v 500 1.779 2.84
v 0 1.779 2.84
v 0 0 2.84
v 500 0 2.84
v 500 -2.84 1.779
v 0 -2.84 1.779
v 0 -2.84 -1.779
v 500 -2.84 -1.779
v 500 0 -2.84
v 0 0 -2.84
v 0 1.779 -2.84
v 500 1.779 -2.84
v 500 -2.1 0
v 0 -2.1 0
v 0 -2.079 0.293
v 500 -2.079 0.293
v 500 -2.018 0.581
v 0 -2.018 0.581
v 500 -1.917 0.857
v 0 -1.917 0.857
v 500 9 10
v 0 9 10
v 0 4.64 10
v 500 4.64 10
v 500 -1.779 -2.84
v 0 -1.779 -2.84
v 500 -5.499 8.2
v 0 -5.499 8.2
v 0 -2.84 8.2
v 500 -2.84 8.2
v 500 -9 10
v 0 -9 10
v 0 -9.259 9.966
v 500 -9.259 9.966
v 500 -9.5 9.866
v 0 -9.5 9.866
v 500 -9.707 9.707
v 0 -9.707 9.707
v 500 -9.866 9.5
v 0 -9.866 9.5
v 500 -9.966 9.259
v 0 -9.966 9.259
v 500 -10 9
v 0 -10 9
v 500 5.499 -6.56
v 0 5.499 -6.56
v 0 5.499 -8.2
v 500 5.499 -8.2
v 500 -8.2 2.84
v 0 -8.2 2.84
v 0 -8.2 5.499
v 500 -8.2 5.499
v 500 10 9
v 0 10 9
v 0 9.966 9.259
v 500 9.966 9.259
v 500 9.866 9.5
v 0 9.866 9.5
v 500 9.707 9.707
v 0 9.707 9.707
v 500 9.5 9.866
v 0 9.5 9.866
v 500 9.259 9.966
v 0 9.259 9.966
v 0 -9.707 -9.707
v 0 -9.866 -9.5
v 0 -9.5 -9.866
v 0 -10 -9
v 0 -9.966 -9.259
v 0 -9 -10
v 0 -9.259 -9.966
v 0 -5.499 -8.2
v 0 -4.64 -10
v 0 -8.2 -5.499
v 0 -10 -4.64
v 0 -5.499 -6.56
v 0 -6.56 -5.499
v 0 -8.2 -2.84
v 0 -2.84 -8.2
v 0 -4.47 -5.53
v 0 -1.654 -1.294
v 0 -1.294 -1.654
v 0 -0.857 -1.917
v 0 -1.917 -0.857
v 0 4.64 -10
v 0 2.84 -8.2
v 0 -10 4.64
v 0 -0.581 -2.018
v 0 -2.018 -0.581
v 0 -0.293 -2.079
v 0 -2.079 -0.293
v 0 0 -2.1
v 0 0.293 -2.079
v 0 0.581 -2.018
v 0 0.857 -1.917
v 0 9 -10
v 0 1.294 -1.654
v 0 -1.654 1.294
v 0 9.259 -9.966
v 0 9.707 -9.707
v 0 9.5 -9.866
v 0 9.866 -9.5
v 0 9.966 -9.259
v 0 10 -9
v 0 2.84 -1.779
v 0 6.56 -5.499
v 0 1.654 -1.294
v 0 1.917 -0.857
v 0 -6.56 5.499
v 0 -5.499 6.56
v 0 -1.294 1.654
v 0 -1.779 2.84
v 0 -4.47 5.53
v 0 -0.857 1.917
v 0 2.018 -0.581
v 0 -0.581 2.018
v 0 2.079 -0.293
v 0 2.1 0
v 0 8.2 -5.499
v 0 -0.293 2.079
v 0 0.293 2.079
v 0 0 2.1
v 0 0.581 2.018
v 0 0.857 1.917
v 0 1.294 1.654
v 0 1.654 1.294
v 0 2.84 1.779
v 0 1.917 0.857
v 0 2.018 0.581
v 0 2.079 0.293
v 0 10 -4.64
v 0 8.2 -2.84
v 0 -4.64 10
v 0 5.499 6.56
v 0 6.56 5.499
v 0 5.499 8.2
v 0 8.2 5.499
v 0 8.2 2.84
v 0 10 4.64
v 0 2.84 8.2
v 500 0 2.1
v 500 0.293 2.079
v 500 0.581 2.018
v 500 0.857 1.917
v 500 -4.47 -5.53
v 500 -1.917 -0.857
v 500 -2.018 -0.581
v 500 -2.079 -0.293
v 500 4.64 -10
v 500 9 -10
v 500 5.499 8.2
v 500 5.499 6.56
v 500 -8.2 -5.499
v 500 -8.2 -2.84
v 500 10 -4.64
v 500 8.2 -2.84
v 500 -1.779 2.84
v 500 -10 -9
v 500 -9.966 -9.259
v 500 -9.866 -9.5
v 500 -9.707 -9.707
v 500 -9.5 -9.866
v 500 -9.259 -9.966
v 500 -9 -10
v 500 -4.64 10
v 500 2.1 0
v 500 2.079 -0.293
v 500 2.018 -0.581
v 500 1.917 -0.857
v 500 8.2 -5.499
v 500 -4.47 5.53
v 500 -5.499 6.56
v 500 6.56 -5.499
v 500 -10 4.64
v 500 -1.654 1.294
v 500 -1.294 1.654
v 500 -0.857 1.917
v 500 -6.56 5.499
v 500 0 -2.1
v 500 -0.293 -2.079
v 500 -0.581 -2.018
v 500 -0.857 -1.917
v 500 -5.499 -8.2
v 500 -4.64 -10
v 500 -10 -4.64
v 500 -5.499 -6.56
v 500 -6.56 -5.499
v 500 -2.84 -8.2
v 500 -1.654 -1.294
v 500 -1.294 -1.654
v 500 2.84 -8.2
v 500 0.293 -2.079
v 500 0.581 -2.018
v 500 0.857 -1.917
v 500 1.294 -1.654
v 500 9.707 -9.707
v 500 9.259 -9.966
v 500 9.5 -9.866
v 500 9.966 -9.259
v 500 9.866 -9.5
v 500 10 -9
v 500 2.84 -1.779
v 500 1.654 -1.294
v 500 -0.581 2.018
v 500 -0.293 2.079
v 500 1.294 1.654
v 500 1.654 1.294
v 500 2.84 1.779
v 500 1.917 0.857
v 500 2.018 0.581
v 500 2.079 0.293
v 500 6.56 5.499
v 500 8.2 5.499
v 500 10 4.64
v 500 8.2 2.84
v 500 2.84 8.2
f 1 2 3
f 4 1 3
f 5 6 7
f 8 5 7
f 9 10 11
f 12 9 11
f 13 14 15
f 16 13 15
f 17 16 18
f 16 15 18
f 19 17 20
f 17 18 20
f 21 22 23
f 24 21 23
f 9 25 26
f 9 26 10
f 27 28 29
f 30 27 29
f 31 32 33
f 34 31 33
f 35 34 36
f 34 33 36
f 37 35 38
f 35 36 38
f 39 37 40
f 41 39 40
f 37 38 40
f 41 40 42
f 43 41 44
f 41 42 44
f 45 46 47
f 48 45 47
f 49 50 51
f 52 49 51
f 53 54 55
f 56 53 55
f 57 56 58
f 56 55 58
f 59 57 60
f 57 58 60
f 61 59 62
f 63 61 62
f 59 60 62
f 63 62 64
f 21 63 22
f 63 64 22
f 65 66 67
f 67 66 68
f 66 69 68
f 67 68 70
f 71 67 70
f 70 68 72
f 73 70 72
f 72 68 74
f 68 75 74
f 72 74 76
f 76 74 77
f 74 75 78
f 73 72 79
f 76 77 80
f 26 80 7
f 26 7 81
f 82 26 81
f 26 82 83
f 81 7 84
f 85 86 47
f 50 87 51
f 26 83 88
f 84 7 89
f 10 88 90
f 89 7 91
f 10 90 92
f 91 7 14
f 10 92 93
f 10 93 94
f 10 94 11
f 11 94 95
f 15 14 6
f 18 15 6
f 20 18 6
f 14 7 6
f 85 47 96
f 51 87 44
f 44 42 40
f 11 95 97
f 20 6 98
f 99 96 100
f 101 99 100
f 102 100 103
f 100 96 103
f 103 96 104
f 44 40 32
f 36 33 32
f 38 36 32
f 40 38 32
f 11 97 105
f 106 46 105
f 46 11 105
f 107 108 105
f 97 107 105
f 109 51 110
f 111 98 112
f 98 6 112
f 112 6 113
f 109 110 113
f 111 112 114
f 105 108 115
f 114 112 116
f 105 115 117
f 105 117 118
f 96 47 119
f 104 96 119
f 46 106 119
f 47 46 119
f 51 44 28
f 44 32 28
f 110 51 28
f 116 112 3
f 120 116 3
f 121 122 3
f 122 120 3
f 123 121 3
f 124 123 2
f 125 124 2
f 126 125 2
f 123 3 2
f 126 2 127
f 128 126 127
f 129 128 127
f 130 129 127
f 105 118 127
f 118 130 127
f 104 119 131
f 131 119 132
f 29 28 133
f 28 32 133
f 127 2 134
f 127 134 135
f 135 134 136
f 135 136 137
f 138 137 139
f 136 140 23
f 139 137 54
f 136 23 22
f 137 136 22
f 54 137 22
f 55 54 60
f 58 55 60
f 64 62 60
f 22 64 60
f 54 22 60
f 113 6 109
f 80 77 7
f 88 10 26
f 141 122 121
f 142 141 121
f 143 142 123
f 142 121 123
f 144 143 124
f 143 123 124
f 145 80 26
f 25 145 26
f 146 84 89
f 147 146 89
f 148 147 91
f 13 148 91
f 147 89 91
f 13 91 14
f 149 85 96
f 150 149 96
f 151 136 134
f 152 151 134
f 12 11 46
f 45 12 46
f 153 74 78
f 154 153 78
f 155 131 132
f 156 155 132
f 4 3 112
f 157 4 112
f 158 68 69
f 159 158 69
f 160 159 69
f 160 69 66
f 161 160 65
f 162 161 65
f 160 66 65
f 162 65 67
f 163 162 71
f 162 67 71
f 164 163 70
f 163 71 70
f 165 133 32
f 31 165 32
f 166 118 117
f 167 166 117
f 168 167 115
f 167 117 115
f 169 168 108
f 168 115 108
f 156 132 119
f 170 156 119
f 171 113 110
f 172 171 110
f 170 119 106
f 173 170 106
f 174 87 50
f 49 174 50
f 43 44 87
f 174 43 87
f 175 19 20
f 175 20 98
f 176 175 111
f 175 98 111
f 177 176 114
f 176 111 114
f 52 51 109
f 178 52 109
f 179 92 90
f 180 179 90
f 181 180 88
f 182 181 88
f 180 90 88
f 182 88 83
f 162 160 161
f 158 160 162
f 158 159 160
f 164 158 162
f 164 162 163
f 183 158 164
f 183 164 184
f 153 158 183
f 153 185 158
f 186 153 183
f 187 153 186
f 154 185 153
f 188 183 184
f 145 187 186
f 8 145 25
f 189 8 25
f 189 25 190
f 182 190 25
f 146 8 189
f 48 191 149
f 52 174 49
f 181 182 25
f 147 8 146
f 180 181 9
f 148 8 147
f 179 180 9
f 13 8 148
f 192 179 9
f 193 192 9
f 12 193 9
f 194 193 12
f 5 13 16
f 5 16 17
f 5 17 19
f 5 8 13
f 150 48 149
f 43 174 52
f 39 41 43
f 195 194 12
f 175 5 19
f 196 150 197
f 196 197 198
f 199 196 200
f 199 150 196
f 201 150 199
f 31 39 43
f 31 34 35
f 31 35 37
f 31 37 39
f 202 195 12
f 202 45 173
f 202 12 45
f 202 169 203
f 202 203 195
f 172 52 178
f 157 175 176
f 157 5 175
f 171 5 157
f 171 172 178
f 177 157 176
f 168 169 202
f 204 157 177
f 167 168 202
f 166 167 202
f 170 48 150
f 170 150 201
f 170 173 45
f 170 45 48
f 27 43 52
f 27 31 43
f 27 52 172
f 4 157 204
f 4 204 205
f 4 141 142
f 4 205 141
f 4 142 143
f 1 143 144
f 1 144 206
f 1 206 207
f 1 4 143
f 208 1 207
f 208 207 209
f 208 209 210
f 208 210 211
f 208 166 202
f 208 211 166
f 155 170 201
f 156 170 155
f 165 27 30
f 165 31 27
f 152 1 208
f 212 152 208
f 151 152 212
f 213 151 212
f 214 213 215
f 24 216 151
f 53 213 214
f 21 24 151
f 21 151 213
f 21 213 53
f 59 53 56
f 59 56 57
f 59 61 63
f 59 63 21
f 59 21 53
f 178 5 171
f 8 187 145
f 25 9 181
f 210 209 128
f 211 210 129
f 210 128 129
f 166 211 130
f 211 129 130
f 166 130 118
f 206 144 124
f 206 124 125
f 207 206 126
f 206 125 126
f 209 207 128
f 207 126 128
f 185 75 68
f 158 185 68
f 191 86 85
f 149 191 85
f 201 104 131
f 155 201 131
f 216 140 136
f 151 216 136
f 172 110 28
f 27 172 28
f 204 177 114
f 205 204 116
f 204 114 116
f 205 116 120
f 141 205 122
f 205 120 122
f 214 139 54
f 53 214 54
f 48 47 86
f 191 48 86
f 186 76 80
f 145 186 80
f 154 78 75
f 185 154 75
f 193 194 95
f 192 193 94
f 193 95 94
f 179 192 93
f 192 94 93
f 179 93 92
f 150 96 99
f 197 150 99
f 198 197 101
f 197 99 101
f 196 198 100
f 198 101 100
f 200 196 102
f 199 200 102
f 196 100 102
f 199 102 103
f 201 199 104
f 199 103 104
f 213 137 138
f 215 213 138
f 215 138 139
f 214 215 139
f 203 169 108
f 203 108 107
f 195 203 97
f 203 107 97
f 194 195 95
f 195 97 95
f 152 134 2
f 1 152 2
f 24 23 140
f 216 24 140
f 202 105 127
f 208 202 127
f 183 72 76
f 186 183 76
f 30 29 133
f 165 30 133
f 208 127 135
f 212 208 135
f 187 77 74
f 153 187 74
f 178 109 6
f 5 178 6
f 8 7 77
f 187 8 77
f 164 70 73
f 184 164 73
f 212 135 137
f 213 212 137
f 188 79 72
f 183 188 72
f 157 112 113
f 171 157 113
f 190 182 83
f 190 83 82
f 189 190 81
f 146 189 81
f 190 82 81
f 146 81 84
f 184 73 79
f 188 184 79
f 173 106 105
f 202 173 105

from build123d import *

# Parameters (mm, degrees)
F1_DEPTH = 500


# Not quite as in the source:
# - ends of sketch curves that miss each other by under 0.0002 mm in the source are joined


with BuildPart() as f1:
    # F0 (on Right) → F1 (new body)
    with BuildSketch(Plane.YZ):
        with BuildLine():
            Line((8.2, -10), (9, -10))
            ThreePointArc((9, -10), (9.7071067812, -9.7071067812), (10, -9))
            Line((10, -9), (10, -8.2))
            Line((10, -8.2), (8.2, -8.2))
            Line((8.2, -8.2), (8.2, -10))
        make_face()
        Polygon((5.4993398282, -8.2), (7.1393398282, -8.2), (5.4993398282, -6.56), align=None)
        Polygon((6.56, -5.4993398282), (8.2, -7.1393398282), (8.2, -5.4993398282), align=None)
        with BuildLine():
            Line((8.2, 10), (8.2, 8.2))
            Line((8.2, 8.2), (10, 8.2))
            Line((10, 8.2), (10, 9))
            ThreePointArc((10, 9), (9.7071067812, 9.7071067812), (9, 10))
            Line((9, 10), (8.2, 10))
        make_face()
        Polygon((8.2, 7.1393398282), (6.56, 5.4993398282), (8.2, 5.4993398282), align=None)
        Polygon((5.4993398282, 8.2), (5.4993398282, 6.56), (7.1393398282, 8.2), align=None)
        with BuildLine():
            Line((-9.9999004684, 8.2000055944), (-8.1999004684, 8.2000055944))
            Line((-8.1999004684, 8.2000055944), (-8.1999004684, 10.0000055944))
            Line((-8.1999004684, 10.0000055944), (-8.9999004684, 10.0000055944))
            ThreePointArc((-8.9999004684, 10.0000055944), (-9.7070072496, 9.7071123756), (-9.9999004684, 9.0000055944))
            Line((-9.9999004684, 9.0000055944), (-9.9999004684, 8.2000055944))
        make_face()
        Polygon((-7.1392402967, 8.2000055944), (-5.4992402967, 6.5600055944), (-5.4992402967, 8.2000055944), align=None)
        Polygon((-8.1999004684, 5.4993454226), (-6.5599004684, 5.4993454226), (-8.1999004684, 7.1393454226), align=None)
        with BuildLine():
            Line((-8.1999004684, -9.9999944056), (-8.1999004684, -8.1999944056))
            Line((-8.1999004684, -8.1999944056), (-9.9999004684, -8.1999944056))
            Line((-9.9999004684, -8.1999944056), (-9.9999004684, -8.9999944056))
            ThreePointArc((-9.9999004684, -8.9999944056), (-9.7070072496, -9.7071011868), (-8.9999004684, -9.9999944056))
            Line((-8.9999004684, -9.9999944056), (-8.1999004684, -9.9999944056))
        make_face()
        Polygon((-8.1999004684, -7.1393342338), (-6.5599004684, -5.4993342338), (-8.1999004684, -5.4993342338), align=None)
        Polygon((-5.4992402967, -8.1999944056), (-5.4992402967, -6.5599944056), (-7.1392402967, -8.1999944056), align=None)
        with BuildLine():
            Line((1.9173232366, -0.8566630648), (2.84, -1.7793398282))
            Line((2.84, -1.7793398282), (2.84, 0))
            Line((2.84, 0), (2.1, 0))
            ThreePointArc((2.1, 0), (2.0538231176, -0.4379618723), (1.9173232366, -0.8566630648))
        make_face()
        with BuildLine():
            Line((0, -2.84), (1.7793398282, -2.84))
            Line((1.7793398282, -2.84), (0.8566630648, -1.9173232366))
            ThreePointArc((0.8566630648, -1.9173232366), (0.4379618723, -2.0538231176), (0, -2.1))
            Line((0, -2.1), (0, -2.84))
        make_face()
        with BuildLine():
            Line((-1.7792402967, -2.8399944056), (9.95316e-05, -2.8399944056))
            Line((9.95316e-05, -2.8399944056), (0, -2.1))
            ThreePointArc((0, -2.1), (-0.4378623408, -2.0538175232), (-0.8565635332, -1.9173176422))
            Line((-0.8565635332, -1.9173176422), (-1.7792402967, -2.8399944056))
        make_face()
        Polygon((4.64, -10), (8.2, -10), (8.2, -8.2), (7.1393398282, -8.2), (5.4993398282, -8.2), (2.84, -8.2), align=None)
        Polygon((8.2, -8.2), (10, -8.2), (10, -4.64), (8.2, -2.84), (8.2, -5.4993398282), (8.2, -7.1393398282), align=None)
        with BuildLine():
            ThreePointArc((0, 2.1), (0.4379618723, 2.0538231176), (0.8566630648, 1.9173232366))
            Line((0.8566630648, 1.9173232366), (1.7793398282, 2.84))
            Line((1.7793398282, 2.84), (0, 2.84))
            Line((0, 2.84), (0, 2.1))
        make_face()
        with BuildLine():
            Line((2.1, 0), (2.84, 0))
            Line((2.84, 0), (2.84, 1.7793398282))
            Line((2.84, 1.7793398282), (1.9173232366, 0.8566630648))
            ThreePointArc((1.9173232366, 0.8566630648), (2.0538231176, 0.4379618723), (2.1, 0))
        make_face()
        with BuildLine():
            ThreePointArc((-0.8565635332, 1.917328831), (-0.4378623408, 2.053828712), (9.95316e-05, 2.1000055944))
            Line((9.95316e-05, 2.1000055944), (0, 2.84))
            Line((0, 2.84), (-1.7792402967, 2.8400055944))
            Line((-1.7792402967, 2.8400055944), (-0.8565635332, 1.917328831))
        make_face()
        Polygon((8.2, 8.2), (8.2, 7.1393398282), (8.2, 5.4993398282), (8.2, 2.84), (10, 4.64), (10, 8.2), align=None)
        Polygon((7.1393398282, 8.2), (8.2, 8.2), (8.2, 10), (4.64, 10), (2.84, 8.2), (5.4993398282, 8.2), align=None)
        with BuildLine():
            Line((-2.8399004684, 1.7793454226), (-2.8399004684, 5.5944e-06))
            Line((-2.8399004684, 5.5944e-06), (-2.0999004684, 5.5944e-06))
            ThreePointArc((-2.0999004684, 5.5944e-06), (-2.053723586, 0.4379674667), (-1.917223705, 0.8566686592))
            Line((-1.917223705, 0.8566686592), (-2.8399004684, 1.7793454226))
        make_face()
        Polygon((-8.1999004684, 10.0000055944), (-8.1999004684, 8.2000055944), (-7.1392402967, 8.2000055944), (-5.4992402967, 8.2000055944), (-2.8399004684, 8.2000055944), (-4.6399004684, 10.0000055944), align=None)
        Polygon((-8.1999004684, 5.4993454226), (-8.1999004684, 7.1393454226), (-8.1999004684, 8.2000055944), (-9.9999004684, 8.2000055944), (-9.9999004684, 4.6400055944), (-8.1999004684, 2.8400055944), align=None)
        with BuildLine():
            Line((-2.8399004684, 5.5944e-06), (-2.8399004684, -1.7793342338))
            Line((-2.8399004684, -1.7793342338), (-1.917223705, -0.8566574704))
            ThreePointArc((-1.917223705, -0.8566574704), (-2.053723586, -0.4379562779), (-2.0999004684, 5.5944e-06))
            Line((-2.0999004684, 5.5944e-06), (-2.8399004684, 5.5944e-06))
        make_face()
        Polygon((-9.9999004684, -8.1999944056), (-8.1999004684, -8.1999944056), (-8.1999004684, -7.1393342338), (-8.1999004684, -5.4993342338), (-8.1999004684, -2.8399944056), (-9.9999004684, -4.6399944056), align=None)
        Polygon((-5.4992402967, -8.1999944056), (-7.1392402967, -8.1999944056), (-8.1999004684, -8.1999944056), (-8.1999004684, -9.9999944056), (-4.6399004684, -9.9999944056), (-2.8399004684, -8.1999944056), align=None)
        with BuildLine():
            Line((-2.8399004684, -1.7793342338), (-1.7792402967, -2.8399944056))
            Line((-1.7792402967, -2.8399944056), (-0.8565635332, -1.9173176422))
            ThreePointArc((-0.8565635332, -1.9173176422), (-1.4848247089, -1.4849186461), (-1.917223705, -0.8566574704))
            Line((-1.917223705, -0.8566574704), (-2.8399004684, -1.7793342338))
        make_face()
        Polygon((-4.4695703825, -5.5303244915), (-1.7792402967, -2.8399944056), (-2.8399004684, -1.7793342338), (-5.5302305543, -4.4696643197), (-6.5599004684, -5.4993342338), (-8.1999004684, -7.1393342338), (-8.1999004684, -8.1999944056), (-7.1392402967, -8.1999944056), (-5.4992402967, -6.5599944056), align=None)
        with BuildLine():
            Line((7.1393398282, -8.2), (8.2, -8.2))
            Line((8.2, -8.2), (8.2, -7.1393398282))
            Line((8.2, -7.1393398282), (6.56, -5.4993398282))
            Line((6.56, -5.4993398282), (5.5303300859, -4.4696699141))
            Line((5.5303300859, -4.4696699141), (2.84, -1.7793398282))
            Line((2.84, -1.7793398282), (1.9173232366, -0.8566630648))
            ThreePointArc((1.9173232366, -0.8566630648), (1.4849242405, -1.4849242405), (0.8566630648, -1.9173232366))
            Line((0.8566630648, -1.9173232366), (1.7793398282, -2.84))
            Line((1.7793398282, -2.84), (4.4696699141, -5.5303300859))
            Line((4.4696699141, -5.5303300859), (5.4993398282, -6.56))
            Line((5.4993398282, -6.56), (7.1393398282, -8.2))
        make_face()
        with BuildLine():
            Line((1.9173232366, 0.8566630648), (2.84, 1.7793398282))
            Line((2.84, 1.7793398282), (5.5303300859, 4.4696699141))
            Line((5.5303300859, 4.4696699141), (6.56, 5.4993398282))
            Line((6.56, 5.4993398282), (8.2, 7.1393398282))
            Line((8.2, 7.1393398282), (8.2, 8.2))
            Line((8.2, 8.2), (7.1393398282, 8.2))
            Line((7.1393398282, 8.2), (5.4993398282, 6.56))
            Line((5.4993398282, 6.56), (4.4696699141, 5.5303300859))
            Line((4.4696699141, 5.5303300859), (1.7793398282, 2.84))
            Line((1.7793398282, 2.84), (0.8566630648, 1.9173232366))
            ThreePointArc((0.8566630648, 1.9173232366), (1.4849242405, 1.4849242405), (1.9173232366, 0.8566630648))
        make_face()
        with BuildLine():
            Line((-5.5302305543, 4.4696755085), (-2.8399004684, 1.7793454226))
            Line((-2.8399004684, 1.7793454226), (-1.917223705, 0.8566686592))
            ThreePointArc((-1.917223705, 0.8566686592), (-1.4848247089, 1.4849298349), (-0.8565635332, 1.917328831))
            Line((-0.8565635332, 1.917328831), (-1.7792402967, 2.8400055944))
            Line((-1.7792402967, 2.8400055944), (-4.4695703825, 5.5303356803))
            Line((-4.4695703825, 5.5303356803), (-5.4992402967, 6.5600055944))
            Line((-5.4992402967, 6.5600055944), (-7.1392402967, 8.2000055944))
            Line((-7.1392402967, 8.2000055944), (-8.1999004684, 8.2000055944))
            Line((-8.1999004684, 8.2000055944), (-8.1999004684, 7.1393454226))
            Line((-8.1999004684, 7.1393454226), (-6.5599004684, 5.4993454226))
            Line((-6.5599004684, 5.4993454226), (-5.5302305543, 4.4696755085))
        make_face()
    extrude(amount=F1_DEPTH)


solid = f1.part
